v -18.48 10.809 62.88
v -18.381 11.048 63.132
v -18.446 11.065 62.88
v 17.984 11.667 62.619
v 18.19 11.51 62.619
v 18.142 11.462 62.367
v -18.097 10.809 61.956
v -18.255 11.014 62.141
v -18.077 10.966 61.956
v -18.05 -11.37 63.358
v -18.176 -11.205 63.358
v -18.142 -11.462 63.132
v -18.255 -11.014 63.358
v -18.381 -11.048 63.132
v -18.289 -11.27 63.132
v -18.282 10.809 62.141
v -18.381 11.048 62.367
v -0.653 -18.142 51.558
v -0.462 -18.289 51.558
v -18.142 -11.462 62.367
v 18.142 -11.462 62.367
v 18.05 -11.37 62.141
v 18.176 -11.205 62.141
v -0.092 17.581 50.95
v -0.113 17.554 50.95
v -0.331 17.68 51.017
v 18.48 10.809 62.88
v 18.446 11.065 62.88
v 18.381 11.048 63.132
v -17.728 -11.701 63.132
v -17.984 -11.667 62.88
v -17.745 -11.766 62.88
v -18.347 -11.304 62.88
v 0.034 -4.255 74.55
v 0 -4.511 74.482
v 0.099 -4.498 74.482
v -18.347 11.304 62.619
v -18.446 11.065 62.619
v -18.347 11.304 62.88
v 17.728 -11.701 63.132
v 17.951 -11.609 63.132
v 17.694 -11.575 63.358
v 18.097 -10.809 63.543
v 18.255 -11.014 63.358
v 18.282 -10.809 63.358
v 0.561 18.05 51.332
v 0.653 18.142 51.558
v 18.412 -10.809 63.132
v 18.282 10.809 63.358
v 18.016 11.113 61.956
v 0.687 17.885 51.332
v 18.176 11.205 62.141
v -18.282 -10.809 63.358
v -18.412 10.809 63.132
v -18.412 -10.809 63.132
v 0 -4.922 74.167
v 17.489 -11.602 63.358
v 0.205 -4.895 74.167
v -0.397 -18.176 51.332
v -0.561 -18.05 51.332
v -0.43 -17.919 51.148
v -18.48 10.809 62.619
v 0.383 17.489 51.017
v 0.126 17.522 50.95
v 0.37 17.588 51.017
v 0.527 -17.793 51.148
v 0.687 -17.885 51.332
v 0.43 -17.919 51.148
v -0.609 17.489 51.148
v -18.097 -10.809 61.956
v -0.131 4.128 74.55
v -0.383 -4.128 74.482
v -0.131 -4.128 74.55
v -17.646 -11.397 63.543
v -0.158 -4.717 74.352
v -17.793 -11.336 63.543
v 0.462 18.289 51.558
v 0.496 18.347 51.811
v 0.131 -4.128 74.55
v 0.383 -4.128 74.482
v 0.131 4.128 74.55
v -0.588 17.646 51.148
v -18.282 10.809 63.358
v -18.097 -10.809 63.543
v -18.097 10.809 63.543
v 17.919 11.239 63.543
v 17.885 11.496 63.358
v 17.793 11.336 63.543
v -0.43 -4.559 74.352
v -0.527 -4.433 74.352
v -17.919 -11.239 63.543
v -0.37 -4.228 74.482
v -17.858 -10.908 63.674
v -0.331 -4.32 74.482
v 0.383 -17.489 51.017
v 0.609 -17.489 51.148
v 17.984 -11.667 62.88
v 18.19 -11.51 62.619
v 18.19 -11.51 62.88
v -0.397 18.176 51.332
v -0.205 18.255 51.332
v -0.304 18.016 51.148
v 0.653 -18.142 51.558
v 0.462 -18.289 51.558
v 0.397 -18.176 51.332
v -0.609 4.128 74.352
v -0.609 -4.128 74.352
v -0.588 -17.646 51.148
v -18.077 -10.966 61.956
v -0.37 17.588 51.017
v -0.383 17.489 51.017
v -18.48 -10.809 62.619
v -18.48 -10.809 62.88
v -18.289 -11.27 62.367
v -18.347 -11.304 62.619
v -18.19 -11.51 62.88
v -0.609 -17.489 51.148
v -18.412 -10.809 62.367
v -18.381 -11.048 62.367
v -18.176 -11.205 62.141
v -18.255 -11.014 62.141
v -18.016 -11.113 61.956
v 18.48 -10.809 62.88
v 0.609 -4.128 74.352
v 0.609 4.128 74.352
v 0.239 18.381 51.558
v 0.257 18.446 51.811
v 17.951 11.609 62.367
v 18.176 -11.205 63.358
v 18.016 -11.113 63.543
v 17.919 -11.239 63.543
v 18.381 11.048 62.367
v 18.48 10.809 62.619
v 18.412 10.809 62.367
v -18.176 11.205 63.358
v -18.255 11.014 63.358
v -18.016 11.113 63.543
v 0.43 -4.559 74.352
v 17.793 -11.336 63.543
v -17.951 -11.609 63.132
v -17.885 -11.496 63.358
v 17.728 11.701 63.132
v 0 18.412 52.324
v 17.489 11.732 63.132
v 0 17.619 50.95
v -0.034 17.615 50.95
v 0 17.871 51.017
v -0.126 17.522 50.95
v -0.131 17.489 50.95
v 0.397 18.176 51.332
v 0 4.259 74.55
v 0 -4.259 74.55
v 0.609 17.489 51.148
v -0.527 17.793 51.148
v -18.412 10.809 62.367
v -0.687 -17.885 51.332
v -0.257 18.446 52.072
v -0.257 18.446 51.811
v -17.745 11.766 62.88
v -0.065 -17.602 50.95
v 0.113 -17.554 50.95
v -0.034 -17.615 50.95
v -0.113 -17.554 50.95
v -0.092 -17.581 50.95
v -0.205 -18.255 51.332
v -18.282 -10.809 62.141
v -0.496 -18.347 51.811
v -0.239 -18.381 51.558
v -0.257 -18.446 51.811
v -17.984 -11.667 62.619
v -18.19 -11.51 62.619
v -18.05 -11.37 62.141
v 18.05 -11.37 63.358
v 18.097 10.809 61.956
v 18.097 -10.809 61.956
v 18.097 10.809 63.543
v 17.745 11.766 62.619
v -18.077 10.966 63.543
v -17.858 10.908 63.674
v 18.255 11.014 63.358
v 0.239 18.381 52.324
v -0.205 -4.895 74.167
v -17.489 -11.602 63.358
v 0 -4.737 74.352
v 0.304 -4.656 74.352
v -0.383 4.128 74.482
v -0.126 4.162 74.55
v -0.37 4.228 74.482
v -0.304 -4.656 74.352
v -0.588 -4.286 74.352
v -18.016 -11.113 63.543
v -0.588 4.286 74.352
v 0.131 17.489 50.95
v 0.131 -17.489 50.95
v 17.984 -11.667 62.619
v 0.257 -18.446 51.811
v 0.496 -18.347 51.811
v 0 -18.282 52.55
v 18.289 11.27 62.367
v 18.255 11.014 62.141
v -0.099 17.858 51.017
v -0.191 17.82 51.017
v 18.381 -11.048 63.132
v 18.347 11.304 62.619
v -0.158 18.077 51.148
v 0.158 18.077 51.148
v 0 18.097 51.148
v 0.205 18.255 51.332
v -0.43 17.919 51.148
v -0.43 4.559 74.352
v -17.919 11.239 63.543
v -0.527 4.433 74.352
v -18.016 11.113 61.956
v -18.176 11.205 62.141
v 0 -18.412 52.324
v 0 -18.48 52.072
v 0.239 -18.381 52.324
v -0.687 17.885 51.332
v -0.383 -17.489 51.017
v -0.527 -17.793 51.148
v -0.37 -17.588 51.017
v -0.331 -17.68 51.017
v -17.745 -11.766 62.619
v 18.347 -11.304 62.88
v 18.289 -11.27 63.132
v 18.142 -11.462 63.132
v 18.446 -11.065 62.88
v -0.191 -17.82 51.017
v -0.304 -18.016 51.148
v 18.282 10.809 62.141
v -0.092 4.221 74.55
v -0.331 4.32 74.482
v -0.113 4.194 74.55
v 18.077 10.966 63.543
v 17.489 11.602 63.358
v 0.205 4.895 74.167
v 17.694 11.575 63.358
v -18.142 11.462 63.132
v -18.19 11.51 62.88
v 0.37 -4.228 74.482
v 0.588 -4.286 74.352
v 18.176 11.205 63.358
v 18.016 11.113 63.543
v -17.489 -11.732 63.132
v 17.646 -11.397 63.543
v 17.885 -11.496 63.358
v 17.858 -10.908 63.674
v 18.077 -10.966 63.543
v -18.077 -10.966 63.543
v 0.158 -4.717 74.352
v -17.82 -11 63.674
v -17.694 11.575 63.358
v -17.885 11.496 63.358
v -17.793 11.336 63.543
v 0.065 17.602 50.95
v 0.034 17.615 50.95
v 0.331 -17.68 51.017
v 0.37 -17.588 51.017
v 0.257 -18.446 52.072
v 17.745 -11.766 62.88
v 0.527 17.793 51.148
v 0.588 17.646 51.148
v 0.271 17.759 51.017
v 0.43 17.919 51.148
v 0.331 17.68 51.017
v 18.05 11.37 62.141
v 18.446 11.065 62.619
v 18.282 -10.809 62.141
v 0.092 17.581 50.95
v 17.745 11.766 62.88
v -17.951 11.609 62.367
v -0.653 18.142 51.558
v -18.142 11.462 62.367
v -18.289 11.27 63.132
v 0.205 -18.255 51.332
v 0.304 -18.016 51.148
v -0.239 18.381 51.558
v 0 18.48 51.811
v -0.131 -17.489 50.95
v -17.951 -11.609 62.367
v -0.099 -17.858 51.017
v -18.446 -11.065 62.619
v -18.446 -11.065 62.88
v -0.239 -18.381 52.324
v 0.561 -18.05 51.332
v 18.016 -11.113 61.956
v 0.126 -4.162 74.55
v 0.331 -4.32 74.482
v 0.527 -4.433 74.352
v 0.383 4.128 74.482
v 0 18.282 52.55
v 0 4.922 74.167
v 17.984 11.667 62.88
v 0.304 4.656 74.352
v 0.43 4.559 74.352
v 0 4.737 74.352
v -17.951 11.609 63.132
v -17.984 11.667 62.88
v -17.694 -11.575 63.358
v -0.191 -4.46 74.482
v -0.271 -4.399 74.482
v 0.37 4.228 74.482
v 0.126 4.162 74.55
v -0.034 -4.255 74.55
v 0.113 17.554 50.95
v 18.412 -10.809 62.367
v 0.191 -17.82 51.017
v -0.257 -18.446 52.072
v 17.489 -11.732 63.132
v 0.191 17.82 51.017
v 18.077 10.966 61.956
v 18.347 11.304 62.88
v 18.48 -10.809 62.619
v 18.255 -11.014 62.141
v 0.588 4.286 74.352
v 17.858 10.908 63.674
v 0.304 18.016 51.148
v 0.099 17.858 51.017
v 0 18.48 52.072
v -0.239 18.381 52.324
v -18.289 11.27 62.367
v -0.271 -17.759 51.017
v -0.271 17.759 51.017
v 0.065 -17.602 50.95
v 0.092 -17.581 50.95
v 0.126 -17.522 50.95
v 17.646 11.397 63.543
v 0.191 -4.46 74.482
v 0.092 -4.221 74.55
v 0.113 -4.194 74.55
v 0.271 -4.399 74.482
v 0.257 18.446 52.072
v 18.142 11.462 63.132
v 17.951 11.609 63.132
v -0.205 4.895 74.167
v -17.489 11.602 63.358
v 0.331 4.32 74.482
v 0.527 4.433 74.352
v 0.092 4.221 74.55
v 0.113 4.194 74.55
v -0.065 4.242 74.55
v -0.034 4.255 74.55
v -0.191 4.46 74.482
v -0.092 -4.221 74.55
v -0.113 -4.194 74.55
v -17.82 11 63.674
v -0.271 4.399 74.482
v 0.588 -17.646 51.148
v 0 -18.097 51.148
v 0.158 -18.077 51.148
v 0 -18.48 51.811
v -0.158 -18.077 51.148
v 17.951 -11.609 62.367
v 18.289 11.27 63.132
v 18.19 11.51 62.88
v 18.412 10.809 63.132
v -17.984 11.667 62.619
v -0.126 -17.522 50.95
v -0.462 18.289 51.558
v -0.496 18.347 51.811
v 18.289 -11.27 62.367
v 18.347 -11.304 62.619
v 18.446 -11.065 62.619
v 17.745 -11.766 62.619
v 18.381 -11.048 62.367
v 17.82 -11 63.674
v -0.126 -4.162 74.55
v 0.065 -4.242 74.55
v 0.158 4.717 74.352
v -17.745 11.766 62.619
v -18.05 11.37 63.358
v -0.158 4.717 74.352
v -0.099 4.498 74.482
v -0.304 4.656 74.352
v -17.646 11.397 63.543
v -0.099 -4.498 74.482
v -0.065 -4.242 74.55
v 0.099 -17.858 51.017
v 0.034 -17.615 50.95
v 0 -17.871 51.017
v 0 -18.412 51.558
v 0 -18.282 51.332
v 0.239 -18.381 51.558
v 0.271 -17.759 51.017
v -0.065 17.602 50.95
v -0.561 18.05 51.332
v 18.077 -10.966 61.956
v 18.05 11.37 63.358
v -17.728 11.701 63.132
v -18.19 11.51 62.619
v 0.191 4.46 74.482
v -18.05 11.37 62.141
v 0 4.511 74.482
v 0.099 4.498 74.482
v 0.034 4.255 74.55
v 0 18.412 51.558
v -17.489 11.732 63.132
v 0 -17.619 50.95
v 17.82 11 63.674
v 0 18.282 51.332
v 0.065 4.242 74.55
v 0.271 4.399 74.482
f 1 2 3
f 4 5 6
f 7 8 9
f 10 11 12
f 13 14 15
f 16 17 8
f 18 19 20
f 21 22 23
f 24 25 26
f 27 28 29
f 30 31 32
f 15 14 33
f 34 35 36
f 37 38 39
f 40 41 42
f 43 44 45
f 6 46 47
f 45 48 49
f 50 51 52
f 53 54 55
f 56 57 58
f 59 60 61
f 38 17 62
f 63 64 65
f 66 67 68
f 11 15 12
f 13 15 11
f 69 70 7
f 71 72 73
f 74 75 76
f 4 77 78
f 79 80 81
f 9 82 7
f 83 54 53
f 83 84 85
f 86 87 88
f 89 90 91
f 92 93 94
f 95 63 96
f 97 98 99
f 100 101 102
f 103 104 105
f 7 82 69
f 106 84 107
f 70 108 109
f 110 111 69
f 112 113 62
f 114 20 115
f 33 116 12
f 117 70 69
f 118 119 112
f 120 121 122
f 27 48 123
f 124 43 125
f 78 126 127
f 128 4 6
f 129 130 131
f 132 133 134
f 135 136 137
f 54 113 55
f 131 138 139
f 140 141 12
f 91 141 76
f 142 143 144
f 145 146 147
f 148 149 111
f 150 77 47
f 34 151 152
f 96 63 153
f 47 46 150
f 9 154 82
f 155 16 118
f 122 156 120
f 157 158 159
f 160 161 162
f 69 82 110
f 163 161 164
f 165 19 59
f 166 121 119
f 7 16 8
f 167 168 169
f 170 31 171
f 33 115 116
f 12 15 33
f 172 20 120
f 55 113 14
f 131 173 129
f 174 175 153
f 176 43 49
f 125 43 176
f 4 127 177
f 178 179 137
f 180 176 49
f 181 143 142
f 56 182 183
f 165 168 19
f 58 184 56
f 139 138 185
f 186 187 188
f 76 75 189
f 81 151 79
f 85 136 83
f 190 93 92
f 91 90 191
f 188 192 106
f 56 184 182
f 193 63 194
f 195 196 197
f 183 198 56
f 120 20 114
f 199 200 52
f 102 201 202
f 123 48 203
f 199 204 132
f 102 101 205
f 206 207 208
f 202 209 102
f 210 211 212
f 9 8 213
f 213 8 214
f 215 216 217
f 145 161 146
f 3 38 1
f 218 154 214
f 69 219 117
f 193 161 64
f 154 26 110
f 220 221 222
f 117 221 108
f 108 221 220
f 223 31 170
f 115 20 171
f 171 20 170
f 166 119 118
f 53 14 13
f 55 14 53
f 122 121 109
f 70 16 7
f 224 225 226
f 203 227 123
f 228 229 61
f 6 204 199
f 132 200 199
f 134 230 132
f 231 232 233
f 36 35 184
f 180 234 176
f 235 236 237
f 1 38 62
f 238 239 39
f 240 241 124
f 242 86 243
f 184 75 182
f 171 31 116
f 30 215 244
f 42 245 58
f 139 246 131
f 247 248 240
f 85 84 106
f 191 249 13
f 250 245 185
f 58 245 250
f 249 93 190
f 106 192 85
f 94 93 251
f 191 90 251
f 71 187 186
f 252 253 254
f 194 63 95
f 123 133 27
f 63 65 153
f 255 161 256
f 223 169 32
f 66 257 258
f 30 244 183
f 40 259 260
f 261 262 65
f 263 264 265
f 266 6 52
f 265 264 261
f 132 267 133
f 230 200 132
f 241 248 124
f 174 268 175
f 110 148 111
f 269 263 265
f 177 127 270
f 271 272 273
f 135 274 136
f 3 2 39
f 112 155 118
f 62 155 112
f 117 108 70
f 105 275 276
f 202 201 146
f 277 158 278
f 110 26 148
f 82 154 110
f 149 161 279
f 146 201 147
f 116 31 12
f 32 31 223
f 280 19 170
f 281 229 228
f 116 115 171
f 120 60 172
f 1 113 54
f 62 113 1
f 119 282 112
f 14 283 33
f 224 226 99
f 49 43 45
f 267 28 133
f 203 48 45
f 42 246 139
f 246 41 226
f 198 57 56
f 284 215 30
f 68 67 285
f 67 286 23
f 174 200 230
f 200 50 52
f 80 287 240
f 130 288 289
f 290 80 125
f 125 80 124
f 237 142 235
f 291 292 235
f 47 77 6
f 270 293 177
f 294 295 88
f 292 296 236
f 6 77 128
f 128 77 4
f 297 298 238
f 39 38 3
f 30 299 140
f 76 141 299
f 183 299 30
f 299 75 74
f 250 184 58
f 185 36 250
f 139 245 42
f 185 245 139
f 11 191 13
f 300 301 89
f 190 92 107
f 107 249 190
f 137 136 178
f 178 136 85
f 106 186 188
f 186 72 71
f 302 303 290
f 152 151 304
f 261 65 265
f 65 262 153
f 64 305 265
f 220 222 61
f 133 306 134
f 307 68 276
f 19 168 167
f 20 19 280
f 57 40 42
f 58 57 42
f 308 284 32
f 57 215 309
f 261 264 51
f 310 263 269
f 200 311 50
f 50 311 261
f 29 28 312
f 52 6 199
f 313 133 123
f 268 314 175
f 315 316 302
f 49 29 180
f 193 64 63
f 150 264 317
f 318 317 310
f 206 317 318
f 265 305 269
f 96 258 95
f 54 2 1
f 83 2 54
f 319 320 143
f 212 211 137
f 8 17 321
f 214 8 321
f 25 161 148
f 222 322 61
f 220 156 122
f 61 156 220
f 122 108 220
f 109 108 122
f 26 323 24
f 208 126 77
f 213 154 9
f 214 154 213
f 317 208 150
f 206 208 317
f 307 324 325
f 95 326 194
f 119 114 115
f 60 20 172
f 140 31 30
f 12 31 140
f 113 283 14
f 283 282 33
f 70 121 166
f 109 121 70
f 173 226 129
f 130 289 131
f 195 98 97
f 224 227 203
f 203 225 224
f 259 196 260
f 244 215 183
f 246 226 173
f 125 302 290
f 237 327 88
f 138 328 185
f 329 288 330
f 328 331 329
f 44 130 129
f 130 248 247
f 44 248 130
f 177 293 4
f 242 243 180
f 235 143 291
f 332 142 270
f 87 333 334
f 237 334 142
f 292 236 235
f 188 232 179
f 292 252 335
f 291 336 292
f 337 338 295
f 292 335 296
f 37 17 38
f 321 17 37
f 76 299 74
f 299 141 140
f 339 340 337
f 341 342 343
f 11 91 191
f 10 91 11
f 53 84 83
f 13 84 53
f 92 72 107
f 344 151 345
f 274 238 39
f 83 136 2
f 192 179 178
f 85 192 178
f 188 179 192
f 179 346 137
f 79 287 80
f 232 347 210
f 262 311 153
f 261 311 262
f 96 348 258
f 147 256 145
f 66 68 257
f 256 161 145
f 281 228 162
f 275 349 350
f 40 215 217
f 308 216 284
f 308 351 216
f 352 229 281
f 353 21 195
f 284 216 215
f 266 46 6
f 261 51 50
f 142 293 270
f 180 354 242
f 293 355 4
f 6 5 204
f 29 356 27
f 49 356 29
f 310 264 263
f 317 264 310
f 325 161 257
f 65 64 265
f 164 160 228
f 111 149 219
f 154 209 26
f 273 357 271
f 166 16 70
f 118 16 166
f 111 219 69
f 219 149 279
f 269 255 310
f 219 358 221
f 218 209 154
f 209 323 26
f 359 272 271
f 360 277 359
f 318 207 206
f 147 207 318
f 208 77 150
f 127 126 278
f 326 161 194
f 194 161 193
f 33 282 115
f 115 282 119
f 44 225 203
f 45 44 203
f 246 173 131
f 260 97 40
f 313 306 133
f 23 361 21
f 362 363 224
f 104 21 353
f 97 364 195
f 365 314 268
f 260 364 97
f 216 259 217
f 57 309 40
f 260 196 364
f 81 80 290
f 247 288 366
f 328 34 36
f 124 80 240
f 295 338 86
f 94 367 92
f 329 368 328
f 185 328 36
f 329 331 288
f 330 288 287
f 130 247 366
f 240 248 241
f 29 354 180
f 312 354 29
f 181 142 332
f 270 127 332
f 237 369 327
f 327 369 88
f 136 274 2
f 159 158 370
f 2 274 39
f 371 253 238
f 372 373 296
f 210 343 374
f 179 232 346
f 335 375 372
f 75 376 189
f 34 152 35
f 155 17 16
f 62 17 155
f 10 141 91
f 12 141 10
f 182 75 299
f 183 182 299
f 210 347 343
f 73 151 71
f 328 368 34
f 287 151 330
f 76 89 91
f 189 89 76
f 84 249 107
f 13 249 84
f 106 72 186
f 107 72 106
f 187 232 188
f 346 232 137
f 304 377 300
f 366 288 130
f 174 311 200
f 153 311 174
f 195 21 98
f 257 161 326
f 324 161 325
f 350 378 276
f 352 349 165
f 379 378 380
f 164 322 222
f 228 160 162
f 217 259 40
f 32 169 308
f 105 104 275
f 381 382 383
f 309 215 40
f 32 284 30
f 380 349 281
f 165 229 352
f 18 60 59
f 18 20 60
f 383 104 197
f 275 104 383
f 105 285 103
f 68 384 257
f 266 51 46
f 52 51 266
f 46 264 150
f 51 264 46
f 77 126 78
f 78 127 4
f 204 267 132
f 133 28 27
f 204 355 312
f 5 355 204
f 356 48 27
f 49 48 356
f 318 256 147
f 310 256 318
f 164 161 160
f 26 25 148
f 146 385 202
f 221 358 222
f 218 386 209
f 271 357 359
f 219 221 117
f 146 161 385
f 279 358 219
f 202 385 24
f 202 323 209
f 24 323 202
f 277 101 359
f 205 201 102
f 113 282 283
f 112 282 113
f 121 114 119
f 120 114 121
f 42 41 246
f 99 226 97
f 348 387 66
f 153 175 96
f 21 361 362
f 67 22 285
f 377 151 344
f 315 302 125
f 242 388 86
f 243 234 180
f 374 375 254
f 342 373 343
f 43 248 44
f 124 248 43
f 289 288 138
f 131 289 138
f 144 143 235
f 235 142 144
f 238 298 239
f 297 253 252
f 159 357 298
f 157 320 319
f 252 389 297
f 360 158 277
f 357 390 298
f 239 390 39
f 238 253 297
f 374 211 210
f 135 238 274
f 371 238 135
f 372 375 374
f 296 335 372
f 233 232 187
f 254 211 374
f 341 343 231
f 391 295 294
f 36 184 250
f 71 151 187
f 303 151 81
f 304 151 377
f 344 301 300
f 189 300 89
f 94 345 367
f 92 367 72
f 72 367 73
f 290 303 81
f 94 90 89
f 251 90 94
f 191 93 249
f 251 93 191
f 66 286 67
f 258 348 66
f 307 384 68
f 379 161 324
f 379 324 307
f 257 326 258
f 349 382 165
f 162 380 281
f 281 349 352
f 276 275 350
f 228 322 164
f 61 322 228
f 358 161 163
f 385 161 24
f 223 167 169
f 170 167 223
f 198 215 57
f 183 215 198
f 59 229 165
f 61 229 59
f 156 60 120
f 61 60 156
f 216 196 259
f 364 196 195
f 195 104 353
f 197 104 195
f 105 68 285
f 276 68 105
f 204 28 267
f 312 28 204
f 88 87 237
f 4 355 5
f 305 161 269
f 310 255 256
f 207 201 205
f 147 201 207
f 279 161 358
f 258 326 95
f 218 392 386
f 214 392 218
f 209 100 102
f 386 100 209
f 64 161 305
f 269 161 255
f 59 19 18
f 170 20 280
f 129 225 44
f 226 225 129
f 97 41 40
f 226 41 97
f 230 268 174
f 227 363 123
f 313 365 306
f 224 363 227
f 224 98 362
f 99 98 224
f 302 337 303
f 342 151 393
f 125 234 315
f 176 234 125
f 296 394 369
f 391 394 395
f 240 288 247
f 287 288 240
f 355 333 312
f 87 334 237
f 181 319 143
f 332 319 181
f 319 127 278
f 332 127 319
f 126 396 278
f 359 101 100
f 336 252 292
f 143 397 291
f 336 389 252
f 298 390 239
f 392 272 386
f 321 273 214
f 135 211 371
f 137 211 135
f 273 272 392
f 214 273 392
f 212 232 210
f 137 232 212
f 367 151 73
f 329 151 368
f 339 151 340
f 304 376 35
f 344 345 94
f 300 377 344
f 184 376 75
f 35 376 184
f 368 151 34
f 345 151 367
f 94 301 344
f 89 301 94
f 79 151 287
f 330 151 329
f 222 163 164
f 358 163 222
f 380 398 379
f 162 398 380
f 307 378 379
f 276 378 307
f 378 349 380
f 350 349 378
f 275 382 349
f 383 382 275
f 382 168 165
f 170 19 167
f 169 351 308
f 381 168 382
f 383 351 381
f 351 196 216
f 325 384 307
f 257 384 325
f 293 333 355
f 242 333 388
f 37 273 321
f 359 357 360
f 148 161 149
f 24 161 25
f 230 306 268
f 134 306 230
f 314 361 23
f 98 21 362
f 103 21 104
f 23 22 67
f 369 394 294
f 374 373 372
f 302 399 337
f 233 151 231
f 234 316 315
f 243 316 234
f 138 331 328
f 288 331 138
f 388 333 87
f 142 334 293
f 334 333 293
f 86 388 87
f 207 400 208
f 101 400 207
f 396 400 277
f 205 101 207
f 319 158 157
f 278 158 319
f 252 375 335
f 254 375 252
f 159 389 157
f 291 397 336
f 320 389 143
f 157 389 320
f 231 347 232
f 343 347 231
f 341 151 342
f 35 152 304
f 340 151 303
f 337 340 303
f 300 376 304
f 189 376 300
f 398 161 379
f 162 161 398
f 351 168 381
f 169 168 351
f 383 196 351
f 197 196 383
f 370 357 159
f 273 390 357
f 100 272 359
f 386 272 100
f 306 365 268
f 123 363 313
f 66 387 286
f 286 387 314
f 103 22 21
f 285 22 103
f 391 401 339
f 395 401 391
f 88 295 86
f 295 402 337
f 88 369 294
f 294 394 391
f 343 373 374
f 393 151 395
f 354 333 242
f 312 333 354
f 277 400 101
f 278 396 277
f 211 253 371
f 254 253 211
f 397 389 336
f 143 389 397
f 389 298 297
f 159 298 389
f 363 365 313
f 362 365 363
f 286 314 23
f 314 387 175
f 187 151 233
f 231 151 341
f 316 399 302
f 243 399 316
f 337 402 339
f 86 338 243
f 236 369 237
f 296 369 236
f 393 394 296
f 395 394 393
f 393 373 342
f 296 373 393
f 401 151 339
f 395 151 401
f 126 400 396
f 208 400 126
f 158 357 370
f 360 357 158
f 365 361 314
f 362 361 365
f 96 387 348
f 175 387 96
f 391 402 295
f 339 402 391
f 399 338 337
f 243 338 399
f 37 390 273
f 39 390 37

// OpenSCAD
// file: def.scad
inf = 1000;

round_radius = 1;
sticker_margin = 2.5;
sticker_round_radius = 0.75;

phi = (sqrt(5) + 1) / 2;
outer_radius = 80;
edge_length = outer_radius / sqrt(phi * phi * phi * phi + 1) * 2;
inner_radius = sqrt(outer_radius * outer_radius - (edge_length / 2 / cos(54)) * (edge_length / 2 / cos(54)));
cut1_length = edge_length / (1 / (phi * phi) + 2) * 3;
center_cut_length = edge_length * (sin(54) + 1);
cut1_dis = inner_radius * (center_cut_length - cut1_length) / (center_cut_length - edge_length);

theta = atan(edge_length / 2 * tan(54) / inner_radius);

face_inner_radius = edge_length / 2 * tan(54);
face_center_length = edge_length * tan(54) / cos(18);
sticker_cut1_dis = face_inner_radius * (face_center_length - cut1_length) / (face_center_length - edge_length);
sticker_dif_cut1_dis = sticker_cut1_dis - round_radius * tan(theta) + round_radius - sticker_margin;
sticker_int_cut1_dis = sticker_cut1_dis + round_radius / tan(theta) - round_radius + sticker_margin;
sticker_dif_cut2_dis = face_inner_radius - round_radius * tan(theta) + round_radius - sticker_margin;

module _int_cut1() {
    translate([-inf, -inf, cut1_dis + round_radius])
        cube([inf * 2, inf * 2, inf]);
}

module _dif_cut1() {
    translate([-inf, -inf, cut1_dis - round_radius])
        cube([inf * 2, inf * 2, inf]);
}

module _sticker_int_cut1() {
    rotate([-90, 0, 0])
        translate([-inf, -inf, sticker_int_cut1_dis])
            cube([inf * 2, inf * 2, inf]);
}

module _sticker_dif_cut1() {
    rotate([-90, 0, 0])
        translate([-inf, -inf, sticker_dif_cut1_dis])
            cube([inf * 2, inf * 2, inf]);
}

module _sticker_dif_cut2() {
    rotate([-90, 0, 0])
        translate([-inf, -inf, sticker_dif_cut2_dis])
            cube([inf * 2, inf * 2, inf]);
}

module _base() {
    intersection_for(vec = [[0, 0, 0], [90, 90, 0], [90, 0, 90]])
        intersection_for(ang = [theta, -theta, 180 + theta, 180 - theta])
            rotate(vec)
                rotate([0, ang, 0])
                    translate([-inf, -inf, -inner_radius + round_radius])
                        cube([inf * 2, inf * 2, inf]);
}

module _sticker_base() {
    difference() {
        cube([inf, inf, 0.1], center = true);
        for (ang = [0 : 72 : 288])
            rotate([0, 0, ang])
                _sticker_dif_cut2();
    }
}

module _selector_base(dis) {
    intersection_for(vec = [[0, 0, 0], [90, 90, 0], [90, 0, 90]])
        intersection_for(ang = [theta, -theta, 180 + theta, 180 - theta])
            rotate(vec)
                rotate([0, ang, 0])
                    translate([-inf, -inf, -dis])
                        cube([inf * 2, inf * 2, inf]);
}
// main file
include <def.scad>

module edge_block() {
    minkowski() {
        difference() {
            intersection() {
                _base();
                intersection_for(ang = [-theta, theta])
                    rotate([0, ang, 0])
                        _int_cut1();
            }
            for (ang = [90 - theta, -90 + theta])
                rotate([ang, 0, 0])
                    _dif_cut1();
        }
        sphere(r = round_radius, $fn = 24);
    }
}

edge_block();
